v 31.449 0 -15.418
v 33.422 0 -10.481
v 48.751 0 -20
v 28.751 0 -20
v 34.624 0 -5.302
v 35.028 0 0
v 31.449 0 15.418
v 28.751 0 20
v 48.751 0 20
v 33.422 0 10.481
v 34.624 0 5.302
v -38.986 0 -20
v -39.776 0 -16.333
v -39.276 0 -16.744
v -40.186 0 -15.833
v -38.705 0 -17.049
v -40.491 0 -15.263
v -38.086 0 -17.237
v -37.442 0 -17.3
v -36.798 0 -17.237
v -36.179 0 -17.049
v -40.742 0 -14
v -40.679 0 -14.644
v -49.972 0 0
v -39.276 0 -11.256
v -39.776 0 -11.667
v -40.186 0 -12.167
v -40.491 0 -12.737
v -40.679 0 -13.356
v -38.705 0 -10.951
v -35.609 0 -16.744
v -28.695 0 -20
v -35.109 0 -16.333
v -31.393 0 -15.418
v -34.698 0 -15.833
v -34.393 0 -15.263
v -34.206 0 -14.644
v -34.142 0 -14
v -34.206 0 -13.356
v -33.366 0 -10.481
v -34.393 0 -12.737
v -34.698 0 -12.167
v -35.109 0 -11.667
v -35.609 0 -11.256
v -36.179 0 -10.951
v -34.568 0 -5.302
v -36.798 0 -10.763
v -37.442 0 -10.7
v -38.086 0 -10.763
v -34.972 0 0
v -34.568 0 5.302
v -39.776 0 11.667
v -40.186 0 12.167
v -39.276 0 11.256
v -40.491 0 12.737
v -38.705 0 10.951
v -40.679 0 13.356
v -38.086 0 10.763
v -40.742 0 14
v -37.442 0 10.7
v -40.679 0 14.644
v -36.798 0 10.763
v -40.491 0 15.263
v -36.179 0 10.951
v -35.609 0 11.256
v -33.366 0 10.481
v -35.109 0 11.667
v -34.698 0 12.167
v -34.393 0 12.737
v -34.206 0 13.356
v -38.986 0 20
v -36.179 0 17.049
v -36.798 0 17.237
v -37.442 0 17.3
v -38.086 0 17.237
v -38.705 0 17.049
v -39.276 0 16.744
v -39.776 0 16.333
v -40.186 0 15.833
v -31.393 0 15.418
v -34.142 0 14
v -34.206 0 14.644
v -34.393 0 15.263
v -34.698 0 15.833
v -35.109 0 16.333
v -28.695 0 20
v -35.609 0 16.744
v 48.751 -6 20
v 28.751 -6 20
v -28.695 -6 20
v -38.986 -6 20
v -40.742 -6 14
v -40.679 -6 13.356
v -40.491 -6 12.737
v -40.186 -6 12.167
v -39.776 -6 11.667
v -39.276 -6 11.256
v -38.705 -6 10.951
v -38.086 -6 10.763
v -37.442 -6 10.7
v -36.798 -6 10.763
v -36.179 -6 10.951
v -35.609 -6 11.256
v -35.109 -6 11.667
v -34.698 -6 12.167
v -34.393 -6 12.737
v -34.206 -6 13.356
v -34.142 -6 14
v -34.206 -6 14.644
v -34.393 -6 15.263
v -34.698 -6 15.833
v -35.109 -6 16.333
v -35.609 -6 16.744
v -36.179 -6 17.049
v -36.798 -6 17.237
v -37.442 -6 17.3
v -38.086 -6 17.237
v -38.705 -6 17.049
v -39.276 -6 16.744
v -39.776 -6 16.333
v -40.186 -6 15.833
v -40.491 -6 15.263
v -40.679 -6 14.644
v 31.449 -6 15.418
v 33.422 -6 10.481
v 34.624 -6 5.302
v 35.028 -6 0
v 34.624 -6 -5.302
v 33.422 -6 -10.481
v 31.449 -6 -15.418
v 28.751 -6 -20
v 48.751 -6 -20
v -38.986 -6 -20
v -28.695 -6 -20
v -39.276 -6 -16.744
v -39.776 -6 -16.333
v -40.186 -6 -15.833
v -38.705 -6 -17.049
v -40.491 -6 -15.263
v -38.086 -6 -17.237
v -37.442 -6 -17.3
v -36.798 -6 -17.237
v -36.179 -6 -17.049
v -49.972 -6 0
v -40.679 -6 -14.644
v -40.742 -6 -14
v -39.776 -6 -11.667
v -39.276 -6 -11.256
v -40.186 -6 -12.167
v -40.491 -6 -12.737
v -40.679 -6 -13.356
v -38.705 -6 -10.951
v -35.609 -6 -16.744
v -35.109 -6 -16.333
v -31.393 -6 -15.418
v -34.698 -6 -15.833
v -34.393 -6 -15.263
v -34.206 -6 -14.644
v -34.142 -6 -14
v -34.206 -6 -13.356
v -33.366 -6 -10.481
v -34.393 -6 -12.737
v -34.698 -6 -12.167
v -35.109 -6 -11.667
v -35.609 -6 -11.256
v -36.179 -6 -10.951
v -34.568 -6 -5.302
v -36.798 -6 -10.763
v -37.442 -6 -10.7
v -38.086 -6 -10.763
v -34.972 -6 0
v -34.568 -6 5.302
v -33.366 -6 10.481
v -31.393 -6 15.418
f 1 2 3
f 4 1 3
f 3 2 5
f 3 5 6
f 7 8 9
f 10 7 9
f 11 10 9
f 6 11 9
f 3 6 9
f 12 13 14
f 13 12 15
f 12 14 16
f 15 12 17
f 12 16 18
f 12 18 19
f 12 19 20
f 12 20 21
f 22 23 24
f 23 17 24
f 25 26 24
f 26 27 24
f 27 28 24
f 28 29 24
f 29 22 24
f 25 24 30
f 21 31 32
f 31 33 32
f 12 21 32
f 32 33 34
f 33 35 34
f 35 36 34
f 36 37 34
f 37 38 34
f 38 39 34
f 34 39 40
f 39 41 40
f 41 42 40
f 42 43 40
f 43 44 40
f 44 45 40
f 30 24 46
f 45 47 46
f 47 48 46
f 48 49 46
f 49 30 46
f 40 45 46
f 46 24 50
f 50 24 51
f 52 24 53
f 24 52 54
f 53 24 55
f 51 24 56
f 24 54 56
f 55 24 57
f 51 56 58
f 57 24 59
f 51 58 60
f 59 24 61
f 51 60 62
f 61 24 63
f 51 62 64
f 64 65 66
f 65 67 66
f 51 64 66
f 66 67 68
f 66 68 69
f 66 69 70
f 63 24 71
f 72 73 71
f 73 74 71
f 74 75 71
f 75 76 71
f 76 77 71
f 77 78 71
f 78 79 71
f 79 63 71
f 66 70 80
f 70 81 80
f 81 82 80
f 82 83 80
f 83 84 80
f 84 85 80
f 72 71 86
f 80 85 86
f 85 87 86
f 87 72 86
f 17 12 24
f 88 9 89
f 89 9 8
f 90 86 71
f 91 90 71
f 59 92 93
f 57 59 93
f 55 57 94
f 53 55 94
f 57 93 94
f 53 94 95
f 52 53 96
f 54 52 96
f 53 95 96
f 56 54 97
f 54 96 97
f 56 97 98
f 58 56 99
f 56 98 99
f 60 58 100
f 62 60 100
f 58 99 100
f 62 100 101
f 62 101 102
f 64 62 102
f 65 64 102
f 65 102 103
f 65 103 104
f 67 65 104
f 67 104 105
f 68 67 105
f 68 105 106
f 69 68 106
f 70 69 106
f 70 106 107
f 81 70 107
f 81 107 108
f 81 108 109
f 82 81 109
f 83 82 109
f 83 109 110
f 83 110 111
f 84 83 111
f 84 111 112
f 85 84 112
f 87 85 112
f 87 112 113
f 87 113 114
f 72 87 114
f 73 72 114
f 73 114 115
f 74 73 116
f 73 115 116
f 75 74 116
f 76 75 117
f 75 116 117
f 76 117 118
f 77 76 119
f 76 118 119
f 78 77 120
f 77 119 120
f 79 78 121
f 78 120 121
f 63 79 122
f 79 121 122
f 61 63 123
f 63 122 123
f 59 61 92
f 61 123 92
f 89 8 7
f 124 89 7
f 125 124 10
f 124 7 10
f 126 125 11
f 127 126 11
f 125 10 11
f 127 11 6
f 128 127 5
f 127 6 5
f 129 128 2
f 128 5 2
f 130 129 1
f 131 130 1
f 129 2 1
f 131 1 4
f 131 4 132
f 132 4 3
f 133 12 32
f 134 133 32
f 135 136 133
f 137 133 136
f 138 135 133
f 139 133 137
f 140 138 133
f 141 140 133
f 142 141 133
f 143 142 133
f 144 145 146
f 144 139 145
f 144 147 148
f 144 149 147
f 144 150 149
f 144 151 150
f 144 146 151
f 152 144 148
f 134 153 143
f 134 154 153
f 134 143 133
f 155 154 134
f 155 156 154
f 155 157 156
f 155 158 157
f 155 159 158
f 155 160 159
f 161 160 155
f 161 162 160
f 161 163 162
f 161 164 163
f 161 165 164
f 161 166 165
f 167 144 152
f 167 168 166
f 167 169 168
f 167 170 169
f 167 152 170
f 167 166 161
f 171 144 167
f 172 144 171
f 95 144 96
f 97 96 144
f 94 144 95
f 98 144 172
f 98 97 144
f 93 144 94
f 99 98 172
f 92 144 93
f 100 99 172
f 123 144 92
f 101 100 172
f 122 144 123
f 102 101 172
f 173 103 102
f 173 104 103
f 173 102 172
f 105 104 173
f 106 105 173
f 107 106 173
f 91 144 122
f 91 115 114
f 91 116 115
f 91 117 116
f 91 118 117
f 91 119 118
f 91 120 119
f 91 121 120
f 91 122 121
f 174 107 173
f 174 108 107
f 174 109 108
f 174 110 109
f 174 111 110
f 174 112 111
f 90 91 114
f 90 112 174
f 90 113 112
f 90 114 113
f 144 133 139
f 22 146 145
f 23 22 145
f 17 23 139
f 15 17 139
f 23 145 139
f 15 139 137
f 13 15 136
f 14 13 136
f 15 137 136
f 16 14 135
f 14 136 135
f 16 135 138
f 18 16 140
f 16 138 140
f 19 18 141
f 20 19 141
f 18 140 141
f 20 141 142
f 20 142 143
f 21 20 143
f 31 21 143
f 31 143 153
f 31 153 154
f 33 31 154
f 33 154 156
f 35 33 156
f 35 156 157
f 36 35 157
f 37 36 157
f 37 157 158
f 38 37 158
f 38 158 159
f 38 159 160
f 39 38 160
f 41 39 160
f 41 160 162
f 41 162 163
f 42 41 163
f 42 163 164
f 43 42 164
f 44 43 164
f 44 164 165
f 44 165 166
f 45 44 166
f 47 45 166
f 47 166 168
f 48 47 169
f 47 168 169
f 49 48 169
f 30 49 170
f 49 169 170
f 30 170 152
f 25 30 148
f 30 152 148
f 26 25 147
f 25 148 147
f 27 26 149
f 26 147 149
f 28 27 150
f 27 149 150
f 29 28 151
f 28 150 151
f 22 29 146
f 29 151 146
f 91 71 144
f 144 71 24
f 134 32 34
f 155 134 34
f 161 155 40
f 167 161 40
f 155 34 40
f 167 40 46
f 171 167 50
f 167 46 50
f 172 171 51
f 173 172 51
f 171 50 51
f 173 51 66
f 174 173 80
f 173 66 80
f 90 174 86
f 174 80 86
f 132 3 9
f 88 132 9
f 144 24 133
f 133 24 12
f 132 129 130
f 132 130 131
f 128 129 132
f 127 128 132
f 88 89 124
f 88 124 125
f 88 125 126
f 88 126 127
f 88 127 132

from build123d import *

# Parameters (mm, degrees)
F1_DEPTH = 6
F2_D     = 6.6


with BuildPart() as f1:
    # F0 (on Front) → F1 (new body)
    with BuildSketch(Plane.XZ):
        with BuildLine():
            ThreePointArc((-28.6950568554, -20), (-34.9722436227, 0), (-28.6950568554, 20))
            Line((-28.6950568554, 20), (-34.6132597741, 20))
            ThreePointArc((-34.6132597741, 20), (-39.9722436227, 0), (-34.6132597741, -20))
            Line((-34.6132597741, -20), (-28.6950568554, -20))
        make_face()
        with BuildLine():
            ThreePointArc((-34.6132597741, -20), (-39.9722436227, 0), (-34.6132597741, 20))
            Line((-34.6132597741, 20), (-38.9861218113, 20))
            Line((-38.9861218113, 20), (-49.9722436227, 0))
            Line((-49.9722436227, 0), (-38.9861218113, -20))
            Line((-38.9861218113, -20), (-34.6132597741, -20))
        make_face()
    extrude(amount=F1_DEPTH)

    # F2 (through all)
    with Locations(Plane(origin=(0, 0, 0), x_dir=(1, 0, 0), z_dir=(0, 1, 0))):
        with Locations((-37.4422316131, 14), (-37.4422316131, -14)):
            Hole(F2_D / 2)


with BuildPart() as f1b:
    # F0 (on Front) → F1, piece 2 (new body)
    with BuildSketch(Plane.XZ):
        with BuildLine():
            Line((34.6687725287, 20), (28.75056961, 20))
            ThreePointArc((28.75056961, 20), (35.0277563773, 0), (28.75056961, -20))
            Line((28.75056961, -20), (34.6687725287, -20))
            ThreePointArc((34.6687725287, -20), (40.0277563773, 0), (34.6687725287, 20))
        make_face()
        with BuildLine():
            Line((48.75056961, 20), (34.6687725287, 20))
            ThreePointArc((34.6687725287, 20), (40.0277563773, 0), (34.6687725287, -20))
            Line((34.6687725287, -20), (48.75056961, -20))
            Line((48.75056961, -20), (48.75056961, 20))
        make_face()
    extrude(amount=F1_DEPTH)


solid = Compound([f1.part, f1b.part])
